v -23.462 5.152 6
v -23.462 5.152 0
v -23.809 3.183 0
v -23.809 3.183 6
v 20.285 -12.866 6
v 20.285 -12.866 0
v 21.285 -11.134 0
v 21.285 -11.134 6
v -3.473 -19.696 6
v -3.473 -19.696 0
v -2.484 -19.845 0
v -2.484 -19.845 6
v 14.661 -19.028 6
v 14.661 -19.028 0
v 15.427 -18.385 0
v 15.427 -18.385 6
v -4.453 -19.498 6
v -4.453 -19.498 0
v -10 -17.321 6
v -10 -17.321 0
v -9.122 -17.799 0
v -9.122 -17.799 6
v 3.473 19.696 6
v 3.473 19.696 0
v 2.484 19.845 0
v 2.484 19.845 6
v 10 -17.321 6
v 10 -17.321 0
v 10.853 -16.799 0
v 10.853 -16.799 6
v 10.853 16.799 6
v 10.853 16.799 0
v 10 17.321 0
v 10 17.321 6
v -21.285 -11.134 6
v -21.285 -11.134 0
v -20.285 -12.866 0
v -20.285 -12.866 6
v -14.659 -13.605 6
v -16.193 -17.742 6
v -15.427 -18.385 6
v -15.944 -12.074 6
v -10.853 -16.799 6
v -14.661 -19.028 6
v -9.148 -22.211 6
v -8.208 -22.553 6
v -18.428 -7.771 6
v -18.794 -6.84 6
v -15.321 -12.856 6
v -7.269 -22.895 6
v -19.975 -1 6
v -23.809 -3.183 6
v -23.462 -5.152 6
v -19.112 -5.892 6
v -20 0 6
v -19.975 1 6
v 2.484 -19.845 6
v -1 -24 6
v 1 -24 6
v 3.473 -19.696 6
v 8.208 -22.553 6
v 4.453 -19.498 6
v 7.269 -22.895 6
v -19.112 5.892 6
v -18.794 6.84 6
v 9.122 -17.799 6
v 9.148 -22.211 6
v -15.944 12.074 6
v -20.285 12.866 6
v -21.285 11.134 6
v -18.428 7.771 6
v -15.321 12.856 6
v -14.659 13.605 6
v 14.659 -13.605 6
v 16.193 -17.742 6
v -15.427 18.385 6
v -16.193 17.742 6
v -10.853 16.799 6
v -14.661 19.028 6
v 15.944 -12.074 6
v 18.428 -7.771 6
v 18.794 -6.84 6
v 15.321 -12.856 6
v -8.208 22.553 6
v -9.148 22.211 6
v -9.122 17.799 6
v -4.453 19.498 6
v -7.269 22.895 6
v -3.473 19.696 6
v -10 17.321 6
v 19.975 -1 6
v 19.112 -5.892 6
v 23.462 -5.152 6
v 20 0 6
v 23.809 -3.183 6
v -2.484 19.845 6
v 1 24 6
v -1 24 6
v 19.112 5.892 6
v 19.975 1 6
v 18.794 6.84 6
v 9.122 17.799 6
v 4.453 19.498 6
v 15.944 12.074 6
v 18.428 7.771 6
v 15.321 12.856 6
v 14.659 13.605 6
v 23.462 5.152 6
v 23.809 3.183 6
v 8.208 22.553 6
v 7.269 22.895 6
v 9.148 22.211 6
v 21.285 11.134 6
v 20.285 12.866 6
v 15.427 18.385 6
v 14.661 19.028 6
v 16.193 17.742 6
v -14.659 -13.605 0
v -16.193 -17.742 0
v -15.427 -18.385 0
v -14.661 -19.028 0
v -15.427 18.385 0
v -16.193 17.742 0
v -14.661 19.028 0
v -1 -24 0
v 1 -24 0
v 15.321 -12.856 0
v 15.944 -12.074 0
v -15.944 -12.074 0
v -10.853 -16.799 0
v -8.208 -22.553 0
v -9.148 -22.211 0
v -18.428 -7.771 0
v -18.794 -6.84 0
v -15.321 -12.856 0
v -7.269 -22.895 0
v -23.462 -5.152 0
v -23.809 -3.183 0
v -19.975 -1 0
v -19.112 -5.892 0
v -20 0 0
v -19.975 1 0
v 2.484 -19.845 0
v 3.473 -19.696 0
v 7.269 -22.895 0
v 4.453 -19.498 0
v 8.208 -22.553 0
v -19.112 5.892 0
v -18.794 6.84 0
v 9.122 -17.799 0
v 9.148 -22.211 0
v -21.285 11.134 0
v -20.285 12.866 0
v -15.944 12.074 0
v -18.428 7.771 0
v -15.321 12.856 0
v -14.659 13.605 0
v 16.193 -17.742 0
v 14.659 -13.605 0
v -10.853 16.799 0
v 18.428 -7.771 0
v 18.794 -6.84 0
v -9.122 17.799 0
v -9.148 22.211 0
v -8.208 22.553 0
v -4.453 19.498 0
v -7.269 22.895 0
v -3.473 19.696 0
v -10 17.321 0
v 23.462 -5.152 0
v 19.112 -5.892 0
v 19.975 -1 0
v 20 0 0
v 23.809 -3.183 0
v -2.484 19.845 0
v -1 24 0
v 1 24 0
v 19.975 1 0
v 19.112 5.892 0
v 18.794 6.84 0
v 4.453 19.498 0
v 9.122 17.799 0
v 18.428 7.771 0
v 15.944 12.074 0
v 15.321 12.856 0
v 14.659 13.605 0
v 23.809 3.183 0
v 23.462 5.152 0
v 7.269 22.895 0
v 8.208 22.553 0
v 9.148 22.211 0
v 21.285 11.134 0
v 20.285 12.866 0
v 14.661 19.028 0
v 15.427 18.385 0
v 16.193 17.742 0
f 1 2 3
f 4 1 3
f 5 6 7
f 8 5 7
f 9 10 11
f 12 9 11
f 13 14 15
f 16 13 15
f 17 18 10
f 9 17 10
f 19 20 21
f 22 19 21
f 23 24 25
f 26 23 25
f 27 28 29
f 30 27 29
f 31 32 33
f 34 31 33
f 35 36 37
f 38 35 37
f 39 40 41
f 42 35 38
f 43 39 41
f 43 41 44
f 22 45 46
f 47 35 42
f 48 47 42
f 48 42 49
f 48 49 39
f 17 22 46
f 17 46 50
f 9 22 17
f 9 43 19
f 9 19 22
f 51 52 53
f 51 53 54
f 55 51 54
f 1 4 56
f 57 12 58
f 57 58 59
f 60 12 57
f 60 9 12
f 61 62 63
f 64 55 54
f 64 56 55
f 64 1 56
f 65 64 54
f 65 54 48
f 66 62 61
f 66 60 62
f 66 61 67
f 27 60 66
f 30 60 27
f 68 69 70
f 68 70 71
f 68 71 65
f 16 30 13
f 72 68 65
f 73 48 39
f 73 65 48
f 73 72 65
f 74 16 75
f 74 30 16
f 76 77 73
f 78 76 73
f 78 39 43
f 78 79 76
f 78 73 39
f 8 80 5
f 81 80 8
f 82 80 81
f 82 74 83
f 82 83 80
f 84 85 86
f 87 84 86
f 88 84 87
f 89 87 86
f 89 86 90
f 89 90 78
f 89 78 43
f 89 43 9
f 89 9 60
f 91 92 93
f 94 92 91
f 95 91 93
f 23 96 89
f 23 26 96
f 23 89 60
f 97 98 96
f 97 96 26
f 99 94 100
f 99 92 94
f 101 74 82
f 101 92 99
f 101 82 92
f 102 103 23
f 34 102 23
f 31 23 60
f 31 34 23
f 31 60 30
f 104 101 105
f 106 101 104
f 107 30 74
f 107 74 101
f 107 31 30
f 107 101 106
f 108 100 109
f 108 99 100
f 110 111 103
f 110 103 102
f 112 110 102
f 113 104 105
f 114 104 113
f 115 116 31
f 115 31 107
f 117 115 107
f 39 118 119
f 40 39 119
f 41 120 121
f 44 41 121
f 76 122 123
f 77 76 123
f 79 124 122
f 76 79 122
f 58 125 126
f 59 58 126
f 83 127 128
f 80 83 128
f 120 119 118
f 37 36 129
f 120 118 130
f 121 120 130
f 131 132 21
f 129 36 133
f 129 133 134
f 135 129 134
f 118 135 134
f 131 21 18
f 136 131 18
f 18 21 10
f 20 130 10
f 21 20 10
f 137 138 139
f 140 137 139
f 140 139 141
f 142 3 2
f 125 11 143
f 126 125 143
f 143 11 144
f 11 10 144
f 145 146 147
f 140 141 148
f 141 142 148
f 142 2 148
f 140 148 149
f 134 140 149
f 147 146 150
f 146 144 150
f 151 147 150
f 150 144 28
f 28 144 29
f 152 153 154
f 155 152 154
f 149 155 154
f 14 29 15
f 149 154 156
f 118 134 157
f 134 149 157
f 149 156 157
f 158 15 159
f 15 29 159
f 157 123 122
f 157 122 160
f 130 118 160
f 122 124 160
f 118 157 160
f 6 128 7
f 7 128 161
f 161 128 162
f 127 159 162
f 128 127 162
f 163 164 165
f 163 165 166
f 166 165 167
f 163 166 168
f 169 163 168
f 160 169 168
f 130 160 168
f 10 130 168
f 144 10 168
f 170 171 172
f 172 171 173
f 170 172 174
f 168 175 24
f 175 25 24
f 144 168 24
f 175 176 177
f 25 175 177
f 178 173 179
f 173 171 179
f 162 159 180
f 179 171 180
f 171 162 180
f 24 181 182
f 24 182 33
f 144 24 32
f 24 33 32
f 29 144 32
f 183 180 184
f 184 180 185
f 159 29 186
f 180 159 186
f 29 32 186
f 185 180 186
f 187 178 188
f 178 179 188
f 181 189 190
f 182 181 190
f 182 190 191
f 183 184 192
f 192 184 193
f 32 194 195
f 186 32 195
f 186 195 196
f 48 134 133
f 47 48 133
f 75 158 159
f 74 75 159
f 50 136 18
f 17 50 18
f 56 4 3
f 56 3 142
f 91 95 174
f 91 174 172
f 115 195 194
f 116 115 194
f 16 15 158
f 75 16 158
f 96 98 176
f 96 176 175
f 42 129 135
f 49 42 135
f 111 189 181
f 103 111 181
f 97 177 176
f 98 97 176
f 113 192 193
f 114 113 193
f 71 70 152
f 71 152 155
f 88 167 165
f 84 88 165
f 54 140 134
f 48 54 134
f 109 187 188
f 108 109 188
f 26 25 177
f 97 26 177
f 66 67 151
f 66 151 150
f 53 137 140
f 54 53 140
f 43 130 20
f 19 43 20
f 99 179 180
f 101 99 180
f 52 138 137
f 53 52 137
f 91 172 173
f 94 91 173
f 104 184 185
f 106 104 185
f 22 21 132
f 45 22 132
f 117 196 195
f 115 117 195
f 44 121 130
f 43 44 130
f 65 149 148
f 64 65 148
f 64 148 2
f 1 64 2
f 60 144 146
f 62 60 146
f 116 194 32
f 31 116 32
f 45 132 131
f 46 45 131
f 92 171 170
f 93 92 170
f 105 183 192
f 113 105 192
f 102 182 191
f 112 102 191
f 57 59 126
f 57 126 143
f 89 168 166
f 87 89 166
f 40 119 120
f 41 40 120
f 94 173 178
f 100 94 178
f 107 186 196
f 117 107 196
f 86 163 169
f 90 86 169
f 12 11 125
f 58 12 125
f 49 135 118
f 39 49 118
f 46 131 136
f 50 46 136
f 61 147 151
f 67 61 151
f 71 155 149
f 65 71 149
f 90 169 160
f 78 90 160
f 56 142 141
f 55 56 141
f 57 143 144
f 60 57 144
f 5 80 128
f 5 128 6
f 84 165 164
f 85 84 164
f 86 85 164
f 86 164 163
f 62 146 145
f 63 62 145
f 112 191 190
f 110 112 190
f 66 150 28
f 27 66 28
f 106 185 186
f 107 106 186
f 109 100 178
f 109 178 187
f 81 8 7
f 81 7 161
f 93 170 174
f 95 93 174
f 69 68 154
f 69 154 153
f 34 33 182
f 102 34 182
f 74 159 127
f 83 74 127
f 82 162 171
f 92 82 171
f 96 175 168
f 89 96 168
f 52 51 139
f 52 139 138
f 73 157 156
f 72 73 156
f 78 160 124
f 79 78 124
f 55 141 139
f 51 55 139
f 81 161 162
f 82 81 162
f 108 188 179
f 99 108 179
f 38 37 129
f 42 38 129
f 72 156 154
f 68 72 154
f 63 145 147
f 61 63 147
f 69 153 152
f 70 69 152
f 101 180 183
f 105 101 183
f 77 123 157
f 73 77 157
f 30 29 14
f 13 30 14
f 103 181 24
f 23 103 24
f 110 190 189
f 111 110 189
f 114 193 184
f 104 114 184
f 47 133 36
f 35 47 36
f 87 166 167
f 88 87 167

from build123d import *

# Parameters (mm, degrees)
F1_DEPTH = 6


# Not quite as in the source:
# - a feature names something its author has since deleted; it is built from what else it names


with BuildPart() as f1:
    # F0 (on Top) → F1 (new body)
    with BuildSketch(Plane.XY):
        with BuildLine():
            Line((19.975, -0.9996874512), (20, 0))
            Line((20, 0), (19.975, 0.9996874512))
            ThreePointArc((19.975, 0.9996874512), (19.6961550602, 3.4729635533), (19.1122733455, 5.892453442))
            Line((19.1122733455, 5.892453442), (18.7938524157, 6.8404028665))
            Line((18.7938524157, 6.8404028665), (18.4284468549, 7.7712512839))
            ThreePointArc((18.4284468549, 7.7712512839), (17.3205080757, 10), (15.9443244585, 12.0738774867))
            Line((15.9443244585, 12.0738774867), (15.3208888624, 12.8557521937))
            Line((15.3208888624, 12.8557521937), (14.6591510441, 13.6054875203))
            ThreePointArc((14.6591510441, 13.6054875203), (12.8557521937, 15.3208888624), (10.8532547285, 16.799013715))
            Line((10.8532547285, 16.799013715), (10, 17.3205080757))
            Line((10, 17.3205080757), (9.1217452715, 17.7987011662))
            ThreePointArc((9.1217452715, 17.7987011662), (6.8404028665, 18.7938524157), (4.4531223014, 19.4979409623))
            Line((4.4531223014, 19.4979409623), (3.4729635533, 19.6961550602))
            Line((3.4729635533, 19.6961550602), (2.4841223964, 19.8451287705))
            ThreePointArc((2.4841223964, 19.8451287705), (0, 20), (-2.4841223964, 19.8451287705))
            Line((-2.4841223964, 19.8451287705), (-3.4729635533, 19.6961550602))
            Line((-3.4729635533, 19.6961550602), (-4.4531223014, 19.4979409623))
            ThreePointArc((-4.4531223014, 19.4979409623), (-6.8404028665, 18.7938524157), (-9.1217452715, 17.7987011662))
            Line((-9.1217452715, 17.7987011662), (-10, 17.3205080757))
            Line((-10, 17.3205080757), (-10.8532547285, 16.799013715))
            ThreePointArc((-10.8532547285, 16.799013715), (-12.8557521937, 15.3208888624), (-14.6591510441, 13.6054875203))
            Line((-14.6591510441, 13.6054875203), (-15.3208888624, 12.8557521937))
            Line((-15.3208888624, 12.8557521937), (-15.9443244585, 12.0738774867))
            ThreePointArc((-15.9443244585, 12.0738774867), (-17.3205080757, 10), (-18.4284468549, 7.7712512839))
            Line((-18.4284468549, 7.7712512839), (-18.7938524157, 6.8404028665))
            Line((-18.7938524157, 6.8404028665), (-19.1122733455, 5.892453442))
            ThreePointArc((-19.1122733455, 5.892453442), (-19.6961550602, 3.4729635533), (-19.975, 0.9996874512))
            Line((-19.975, 0.9996874512), (-20, 0))
            Line((-20, 0), (-19.975, -0.9996874512))
            ThreePointArc((-19.975, -0.9996874512), (-19.6961550602, -3.4729635533), (-19.1122733455, -5.892453442))
            Line((-19.1122733455, -5.892453442), (-18.7938524157, -6.8404028665))
            Line((-18.7938524157, -6.8404028665), (-18.4284468549, -7.7712512839))
            ThreePointArc((-18.4284468549, -7.7712512839), (-17.3205080757, -10), (-15.9443244585, -12.0738774867))
            Line((-15.9443244585, -12.0738774867), (-15.3208888624, -12.8557521937))
            Line((-15.3208888624, -12.8557521937), (-14.6591510441, -13.6054875203))
            ThreePointArc((-14.6591510441, -13.6054875203), (-12.8557521937, -15.3208888624), (-10.8532547285, -16.799013715))
            Line((-10.8532547285, -16.799013715), (-10, -17.3205080757))
            Line((-10, -17.3205080757), (-9.1217452715, -17.7987011662))
            ThreePointArc((-9.1217452715, -17.7987011662), (-6.8404028665, -18.7938524157), (-4.4531223014, -19.4979409623))
            Line((-4.4531223014, -19.4979409623), (-3.4729635533, -19.6961550602))
            Line((-3.4729635533, -19.6961550602), (-2.4841223964, -19.8451287705))
            ThreePointArc((-2.4841223964, -19.8451287705), (0, -20), (2.4841223964, -19.8451287705))
            Line((2.4841223964, -19.8451287705), (3.4729635533, -19.6961550602))
            Line((3.4729635533, -19.6961550602), (4.4531223014, -19.4979409623))
            ThreePointArc((4.4531223014, -19.4979409623), (6.8404028665, -18.7938524157), (9.1217452715, -17.7987011662))
            Line((9.1217452715, -17.7987011662), (10, -17.3205080757))
            Line((10, -17.3205080757), (10.8532547285, -16.799013715))
            ThreePointArc((10.8532547285, -16.799013715), (12.8557521937, -15.3208888624), (14.6591510441, -13.6054875203))
            Line((14.6591510441, -13.6054875203), (15.3208888624, -12.8557521937))
            Line((15.3208888624, -12.8557521937), (15.9443244585, -12.0738774867))
            ThreePointArc((15.9443244585, -12.0738774867), (17.3205080757, -10), (18.4284468549, -7.7712512839))
            Line((18.4284468549, -7.7712512839), (18.7938524157, -6.8404028665))
            Line((18.7938524157, -6.8404028665), (19.1122733455, -5.892453442))
            ThreePointArc((19.1122733455, -5.892453442), (19.6961550602, -3.4729635533), (19.975, -0.9996874512))
        make_face()
        with BuildLine():
            ThreePointArc((-2.4841223964, 19.8451287705), (0, 20), (2.4841223964, 19.8451287705))
            Line((2.4841223964, 19.8451287705), (1, 24))
            Line((1, 24), (0, 24))
            Line((0, 24), (-1, 24))
            Line((-1, 24), (-2.4841223964, 19.8451287705))
        make_face()
        with BuildLine():
            ThreePointArc((4.4531223014, 19.4979409623), (6.8404028665, 18.7938524157), (9.1217452715, 17.7987011662))
            Line((9.1217452715, 17.7987011662), (9.1481760606, 22.2106027555))
            Line((9.1481760606, 22.2106027555), (8.2084834398, 22.5526228989))
            Line((8.2084834398, 22.5526228989), (7.268790819, 22.8946430422))
            Line((7.268790819, 22.8946430422), (4.4531223014, 19.4979409623))
        make_face()
        with BuildLine():
            ThreePointArc((10.8532547285, 16.799013715), (12.8557521937, 15.3208888624), (14.6591510441, 13.6054875203))
            Line((14.6591510441, 13.6054875203), (16.1929470756, 17.7422790252))
            Line((16.1929470756, 17.7422790252), (15.4269026325, 18.3850666349))
            Line((15.4269026325, 18.3850666349), (14.6608581894, 19.0278542445))
            Line((14.6608581894, 19.0278542445), (10.8532547285, 16.799013715))
        make_face()
        with BuildLine():
            ThreePointArc((15.9443244585, 12.0738774867), (17.3205080757, 10), (18.4284468549, 7.7712512839))
            Line((18.4284468549, 7.7712512839), (21.2846096908, 11.1339745962))
            Line((21.2846096908, 11.1339745962), (20.7846096908, 12))
            Line((20.7846096908, 12), (20.2846096908, 12.8660254038))
            Line((20.2846096908, 12.8660254038), (15.9443244585, 12.0738774867))
        make_face()
        with BuildLine():
            ThreePointArc((19.1122733455, 5.892453442), (19.6961550602, 3.4729635533), (19.975, 0.9996874512))
            Line((19.975, 0.9996874512), (23.80903425, 3.182748511))
            Line((23.80903425, 3.182748511), (23.6353860723, 4.167556264))
            Line((23.6353860723, 4.167556264), (23.4617378946, 5.152364017))
            Line((23.4617378946, 5.152364017), (19.1122733455, 5.892453442))
        make_face()
        with BuildLine():
            Line((23.80903425, -3.182748511), (19.975, -0.9996874512))
            ThreePointArc((19.975, -0.9996874512), (19.6961550602, -3.4729635533), (19.1122733455, -5.892453442))
            Line((19.1122733455, -5.892453442), (23.4617378946, -5.152364017))
            Line((23.4617378946, -5.152364017), (23.6353860723, -4.167556264))
            Line((23.6353860723, -4.167556264), (23.80903425, -3.182748511))
        make_face()
        with BuildLine():
            Line((21.2846096908, -11.1339745962), (18.4284468549, -7.7712512839))
            ThreePointArc((18.4284468549, -7.7712512839), (17.3205080757, -10), (15.9443244585, -12.0738774867))
            Line((15.9443244585, -12.0738774867), (20.2846096908, -12.8660254038))
            Line((20.2846096908, -12.8660254038), (20.7846096908, -12))
            Line((20.7846096908, -12), (21.2846096908, -11.1339745962))
        make_face()
        with BuildLine():
            Line((16.1929470756, -17.7422790252), (14.6591510441, -13.6054875203))
            ThreePointArc((14.6591510441, -13.6054875203), (12.8557521937, -15.3208888624), (10.8532547285, -16.799013715))
            Line((10.8532547285, -16.799013715), (14.6608581894, -19.0278542445))
            Line((14.6608581894, -19.0278542445), (15.4269026325, -18.3850666349))
            Line((15.4269026325, -18.3850666349), (16.1929470756, -17.7422790252))
        make_face()
        with BuildLine():
            Line((9.1481760606, -22.2106027555), (9.1217452715, -17.7987011662))
            ThreePointArc((9.1217452715, -17.7987011662), (6.8404028665, -18.7938524157), (4.4531223014, -19.4979409623))
            Line((4.4531223014, -19.4979409623), (7.268790819, -22.8946430422))
            Line((7.268790819, -22.8946430422), (8.2084834398, -22.5526228989))
            Line((8.2084834398, -22.5526228989), (9.1481760606, -22.2106027555))
        make_face()
        with BuildLine():
            Line((1, -24), (2.4841223964, -19.8451287705))
            ThreePointArc((2.4841223964, -19.8451287705), (0, -20), (-2.4841223964, -19.8451287705))
            Line((-2.4841223964, -19.8451287705), (-1, -24))
            Line((-1, -24), (0, -24))
            Line((0, -24), (1, -24))
        make_face()
        with BuildLine():
            Line((-7.268790819, -22.8946430422), (-4.4531223014, -19.4979409623))
            ThreePointArc((-4.4531223014, -19.4979409623), (-6.8404028665, -18.7938524157), (-9.1217452715, -17.7987011662))
            Line((-9.1217452715, -17.7987011662), (-9.1481760606, -22.2106027555))
            Line((-9.1481760606, -22.2106027555), (-8.2084834398, -22.5526228989))
            Line((-8.2084834398, -22.5526228989), (-7.268790819, -22.8946430422))
        make_face()
        with BuildLine():
            Line((-14.6608581894, -19.0278542445), (-10.8532547285, -16.799013715))
            ThreePointArc((-10.8532547285, -16.799013715), (-12.8557521937, -15.3208888624), (-14.6591510441, -13.6054875203))
            Line((-14.6591510441, -13.6054875203), (-16.1929470756, -17.7422790252))
            Line((-16.1929470756, -17.7422790252), (-15.4269026325, -18.3850666349))
            Line((-15.4269026325, -18.3850666349), (-14.6608581894, -19.0278542445))
        make_face()
        with BuildLine():
            Line((-20.2846096908, -12.8660254038), (-15.9443244585, -12.0738774867))
            ThreePointArc((-15.9443244585, -12.0738774867), (-17.3205080757, -10), (-18.4284468549, -7.7712512839))
            Line((-18.4284468549, -7.7712512839), (-21.2846096908, -11.1339745962))
            Line((-21.2846096908, -11.1339745962), (-20.7846096908, -12))
            Line((-20.7846096908, -12), (-20.2846096908, -12.8660254038))
        make_face()
        with BuildLine():
            Line((-23.4617378946, -5.152364017), (-19.1122733455, -5.892453442))
            ThreePointArc((-19.1122733455, -5.892453442), (-19.6961550602, -3.4729635533), (-19.975, -0.9996874512))
            Line((-19.975, -0.9996874512), (-23.80903425, -3.182748511))
            Line((-23.80903425, -3.182748511), (-23.6353860723, -4.167556264))
            Line((-23.6353860723, -4.167556264), (-23.4617378946, -5.152364017))
        make_face()
        with BuildLine():
            ThreePointArc((-19.975, 0.9996874512), (-19.6961550602, 3.4729635533), (-19.1122733455, 5.892453442))
            Line((-19.1122733455, 5.892453442), (-23.4617378946, 5.152364017))
            Line((-23.4617378946, 5.152364017), (-23.6353860723, 4.167556264))
            Line((-23.6353860723, 4.167556264), (-23.80903425, 3.182748511))
            Line((-23.80903425, 3.182748511), (-19.975, 0.9996874512))
        make_face()
        with BuildLine():
            ThreePointArc((-18.4284468549, 7.7712512839), (-17.3205080757, 10), (-15.9443244585, 12.0738774867))
            Line((-15.9443244585, 12.0738774867), (-20.2846096908, 12.8660254038))
            Line((-20.2846096908, 12.8660254038), (-20.7846096908, 12))
            Line((-20.7846096908, 12), (-21.2846096908, 11.1339745962))
            Line((-21.2846096908, 11.1339745962), (-18.4284468549, 7.7712512839))
        make_face()
        with BuildLine():
            ThreePointArc((-14.6591510441, 13.6054875203), (-12.8557521937, 15.3208888624), (-10.8532547285, 16.799013715))
            Line((-10.8532547285, 16.799013715), (-14.6608581894, 19.0278542445))
            Line((-14.6608581894, 19.0278542445), (-15.4269026325, 18.3850666349))
            Line((-15.4269026325, 18.3850666349), (-16.1929470756, 17.7422790252))
            Line((-16.1929470756, 17.7422790252), (-14.6591510441, 13.6054875203))
        make_face()
        with BuildLine():
            ThreePointArc((-9.1217452715, 17.7987011662), (-6.8404028665, 18.7938524157), (-4.4531223014, 19.4979409623))
            Line((-4.4531223014, 19.4979409623), (-7.268790819, 22.8946430422))
            Line((-7.268790819, 22.8946430422), (-8.2084834398, 22.5526228989))
            Line((-8.2084834398, 22.5526228989), (-9.1481760606, 22.2106027555))
            Line((-9.1481760606, 22.2106027555), (-9.1217452715, 17.7987011662))
        make_face()
    extrude(amount=F1_DEPTH)


solid = f1.part
